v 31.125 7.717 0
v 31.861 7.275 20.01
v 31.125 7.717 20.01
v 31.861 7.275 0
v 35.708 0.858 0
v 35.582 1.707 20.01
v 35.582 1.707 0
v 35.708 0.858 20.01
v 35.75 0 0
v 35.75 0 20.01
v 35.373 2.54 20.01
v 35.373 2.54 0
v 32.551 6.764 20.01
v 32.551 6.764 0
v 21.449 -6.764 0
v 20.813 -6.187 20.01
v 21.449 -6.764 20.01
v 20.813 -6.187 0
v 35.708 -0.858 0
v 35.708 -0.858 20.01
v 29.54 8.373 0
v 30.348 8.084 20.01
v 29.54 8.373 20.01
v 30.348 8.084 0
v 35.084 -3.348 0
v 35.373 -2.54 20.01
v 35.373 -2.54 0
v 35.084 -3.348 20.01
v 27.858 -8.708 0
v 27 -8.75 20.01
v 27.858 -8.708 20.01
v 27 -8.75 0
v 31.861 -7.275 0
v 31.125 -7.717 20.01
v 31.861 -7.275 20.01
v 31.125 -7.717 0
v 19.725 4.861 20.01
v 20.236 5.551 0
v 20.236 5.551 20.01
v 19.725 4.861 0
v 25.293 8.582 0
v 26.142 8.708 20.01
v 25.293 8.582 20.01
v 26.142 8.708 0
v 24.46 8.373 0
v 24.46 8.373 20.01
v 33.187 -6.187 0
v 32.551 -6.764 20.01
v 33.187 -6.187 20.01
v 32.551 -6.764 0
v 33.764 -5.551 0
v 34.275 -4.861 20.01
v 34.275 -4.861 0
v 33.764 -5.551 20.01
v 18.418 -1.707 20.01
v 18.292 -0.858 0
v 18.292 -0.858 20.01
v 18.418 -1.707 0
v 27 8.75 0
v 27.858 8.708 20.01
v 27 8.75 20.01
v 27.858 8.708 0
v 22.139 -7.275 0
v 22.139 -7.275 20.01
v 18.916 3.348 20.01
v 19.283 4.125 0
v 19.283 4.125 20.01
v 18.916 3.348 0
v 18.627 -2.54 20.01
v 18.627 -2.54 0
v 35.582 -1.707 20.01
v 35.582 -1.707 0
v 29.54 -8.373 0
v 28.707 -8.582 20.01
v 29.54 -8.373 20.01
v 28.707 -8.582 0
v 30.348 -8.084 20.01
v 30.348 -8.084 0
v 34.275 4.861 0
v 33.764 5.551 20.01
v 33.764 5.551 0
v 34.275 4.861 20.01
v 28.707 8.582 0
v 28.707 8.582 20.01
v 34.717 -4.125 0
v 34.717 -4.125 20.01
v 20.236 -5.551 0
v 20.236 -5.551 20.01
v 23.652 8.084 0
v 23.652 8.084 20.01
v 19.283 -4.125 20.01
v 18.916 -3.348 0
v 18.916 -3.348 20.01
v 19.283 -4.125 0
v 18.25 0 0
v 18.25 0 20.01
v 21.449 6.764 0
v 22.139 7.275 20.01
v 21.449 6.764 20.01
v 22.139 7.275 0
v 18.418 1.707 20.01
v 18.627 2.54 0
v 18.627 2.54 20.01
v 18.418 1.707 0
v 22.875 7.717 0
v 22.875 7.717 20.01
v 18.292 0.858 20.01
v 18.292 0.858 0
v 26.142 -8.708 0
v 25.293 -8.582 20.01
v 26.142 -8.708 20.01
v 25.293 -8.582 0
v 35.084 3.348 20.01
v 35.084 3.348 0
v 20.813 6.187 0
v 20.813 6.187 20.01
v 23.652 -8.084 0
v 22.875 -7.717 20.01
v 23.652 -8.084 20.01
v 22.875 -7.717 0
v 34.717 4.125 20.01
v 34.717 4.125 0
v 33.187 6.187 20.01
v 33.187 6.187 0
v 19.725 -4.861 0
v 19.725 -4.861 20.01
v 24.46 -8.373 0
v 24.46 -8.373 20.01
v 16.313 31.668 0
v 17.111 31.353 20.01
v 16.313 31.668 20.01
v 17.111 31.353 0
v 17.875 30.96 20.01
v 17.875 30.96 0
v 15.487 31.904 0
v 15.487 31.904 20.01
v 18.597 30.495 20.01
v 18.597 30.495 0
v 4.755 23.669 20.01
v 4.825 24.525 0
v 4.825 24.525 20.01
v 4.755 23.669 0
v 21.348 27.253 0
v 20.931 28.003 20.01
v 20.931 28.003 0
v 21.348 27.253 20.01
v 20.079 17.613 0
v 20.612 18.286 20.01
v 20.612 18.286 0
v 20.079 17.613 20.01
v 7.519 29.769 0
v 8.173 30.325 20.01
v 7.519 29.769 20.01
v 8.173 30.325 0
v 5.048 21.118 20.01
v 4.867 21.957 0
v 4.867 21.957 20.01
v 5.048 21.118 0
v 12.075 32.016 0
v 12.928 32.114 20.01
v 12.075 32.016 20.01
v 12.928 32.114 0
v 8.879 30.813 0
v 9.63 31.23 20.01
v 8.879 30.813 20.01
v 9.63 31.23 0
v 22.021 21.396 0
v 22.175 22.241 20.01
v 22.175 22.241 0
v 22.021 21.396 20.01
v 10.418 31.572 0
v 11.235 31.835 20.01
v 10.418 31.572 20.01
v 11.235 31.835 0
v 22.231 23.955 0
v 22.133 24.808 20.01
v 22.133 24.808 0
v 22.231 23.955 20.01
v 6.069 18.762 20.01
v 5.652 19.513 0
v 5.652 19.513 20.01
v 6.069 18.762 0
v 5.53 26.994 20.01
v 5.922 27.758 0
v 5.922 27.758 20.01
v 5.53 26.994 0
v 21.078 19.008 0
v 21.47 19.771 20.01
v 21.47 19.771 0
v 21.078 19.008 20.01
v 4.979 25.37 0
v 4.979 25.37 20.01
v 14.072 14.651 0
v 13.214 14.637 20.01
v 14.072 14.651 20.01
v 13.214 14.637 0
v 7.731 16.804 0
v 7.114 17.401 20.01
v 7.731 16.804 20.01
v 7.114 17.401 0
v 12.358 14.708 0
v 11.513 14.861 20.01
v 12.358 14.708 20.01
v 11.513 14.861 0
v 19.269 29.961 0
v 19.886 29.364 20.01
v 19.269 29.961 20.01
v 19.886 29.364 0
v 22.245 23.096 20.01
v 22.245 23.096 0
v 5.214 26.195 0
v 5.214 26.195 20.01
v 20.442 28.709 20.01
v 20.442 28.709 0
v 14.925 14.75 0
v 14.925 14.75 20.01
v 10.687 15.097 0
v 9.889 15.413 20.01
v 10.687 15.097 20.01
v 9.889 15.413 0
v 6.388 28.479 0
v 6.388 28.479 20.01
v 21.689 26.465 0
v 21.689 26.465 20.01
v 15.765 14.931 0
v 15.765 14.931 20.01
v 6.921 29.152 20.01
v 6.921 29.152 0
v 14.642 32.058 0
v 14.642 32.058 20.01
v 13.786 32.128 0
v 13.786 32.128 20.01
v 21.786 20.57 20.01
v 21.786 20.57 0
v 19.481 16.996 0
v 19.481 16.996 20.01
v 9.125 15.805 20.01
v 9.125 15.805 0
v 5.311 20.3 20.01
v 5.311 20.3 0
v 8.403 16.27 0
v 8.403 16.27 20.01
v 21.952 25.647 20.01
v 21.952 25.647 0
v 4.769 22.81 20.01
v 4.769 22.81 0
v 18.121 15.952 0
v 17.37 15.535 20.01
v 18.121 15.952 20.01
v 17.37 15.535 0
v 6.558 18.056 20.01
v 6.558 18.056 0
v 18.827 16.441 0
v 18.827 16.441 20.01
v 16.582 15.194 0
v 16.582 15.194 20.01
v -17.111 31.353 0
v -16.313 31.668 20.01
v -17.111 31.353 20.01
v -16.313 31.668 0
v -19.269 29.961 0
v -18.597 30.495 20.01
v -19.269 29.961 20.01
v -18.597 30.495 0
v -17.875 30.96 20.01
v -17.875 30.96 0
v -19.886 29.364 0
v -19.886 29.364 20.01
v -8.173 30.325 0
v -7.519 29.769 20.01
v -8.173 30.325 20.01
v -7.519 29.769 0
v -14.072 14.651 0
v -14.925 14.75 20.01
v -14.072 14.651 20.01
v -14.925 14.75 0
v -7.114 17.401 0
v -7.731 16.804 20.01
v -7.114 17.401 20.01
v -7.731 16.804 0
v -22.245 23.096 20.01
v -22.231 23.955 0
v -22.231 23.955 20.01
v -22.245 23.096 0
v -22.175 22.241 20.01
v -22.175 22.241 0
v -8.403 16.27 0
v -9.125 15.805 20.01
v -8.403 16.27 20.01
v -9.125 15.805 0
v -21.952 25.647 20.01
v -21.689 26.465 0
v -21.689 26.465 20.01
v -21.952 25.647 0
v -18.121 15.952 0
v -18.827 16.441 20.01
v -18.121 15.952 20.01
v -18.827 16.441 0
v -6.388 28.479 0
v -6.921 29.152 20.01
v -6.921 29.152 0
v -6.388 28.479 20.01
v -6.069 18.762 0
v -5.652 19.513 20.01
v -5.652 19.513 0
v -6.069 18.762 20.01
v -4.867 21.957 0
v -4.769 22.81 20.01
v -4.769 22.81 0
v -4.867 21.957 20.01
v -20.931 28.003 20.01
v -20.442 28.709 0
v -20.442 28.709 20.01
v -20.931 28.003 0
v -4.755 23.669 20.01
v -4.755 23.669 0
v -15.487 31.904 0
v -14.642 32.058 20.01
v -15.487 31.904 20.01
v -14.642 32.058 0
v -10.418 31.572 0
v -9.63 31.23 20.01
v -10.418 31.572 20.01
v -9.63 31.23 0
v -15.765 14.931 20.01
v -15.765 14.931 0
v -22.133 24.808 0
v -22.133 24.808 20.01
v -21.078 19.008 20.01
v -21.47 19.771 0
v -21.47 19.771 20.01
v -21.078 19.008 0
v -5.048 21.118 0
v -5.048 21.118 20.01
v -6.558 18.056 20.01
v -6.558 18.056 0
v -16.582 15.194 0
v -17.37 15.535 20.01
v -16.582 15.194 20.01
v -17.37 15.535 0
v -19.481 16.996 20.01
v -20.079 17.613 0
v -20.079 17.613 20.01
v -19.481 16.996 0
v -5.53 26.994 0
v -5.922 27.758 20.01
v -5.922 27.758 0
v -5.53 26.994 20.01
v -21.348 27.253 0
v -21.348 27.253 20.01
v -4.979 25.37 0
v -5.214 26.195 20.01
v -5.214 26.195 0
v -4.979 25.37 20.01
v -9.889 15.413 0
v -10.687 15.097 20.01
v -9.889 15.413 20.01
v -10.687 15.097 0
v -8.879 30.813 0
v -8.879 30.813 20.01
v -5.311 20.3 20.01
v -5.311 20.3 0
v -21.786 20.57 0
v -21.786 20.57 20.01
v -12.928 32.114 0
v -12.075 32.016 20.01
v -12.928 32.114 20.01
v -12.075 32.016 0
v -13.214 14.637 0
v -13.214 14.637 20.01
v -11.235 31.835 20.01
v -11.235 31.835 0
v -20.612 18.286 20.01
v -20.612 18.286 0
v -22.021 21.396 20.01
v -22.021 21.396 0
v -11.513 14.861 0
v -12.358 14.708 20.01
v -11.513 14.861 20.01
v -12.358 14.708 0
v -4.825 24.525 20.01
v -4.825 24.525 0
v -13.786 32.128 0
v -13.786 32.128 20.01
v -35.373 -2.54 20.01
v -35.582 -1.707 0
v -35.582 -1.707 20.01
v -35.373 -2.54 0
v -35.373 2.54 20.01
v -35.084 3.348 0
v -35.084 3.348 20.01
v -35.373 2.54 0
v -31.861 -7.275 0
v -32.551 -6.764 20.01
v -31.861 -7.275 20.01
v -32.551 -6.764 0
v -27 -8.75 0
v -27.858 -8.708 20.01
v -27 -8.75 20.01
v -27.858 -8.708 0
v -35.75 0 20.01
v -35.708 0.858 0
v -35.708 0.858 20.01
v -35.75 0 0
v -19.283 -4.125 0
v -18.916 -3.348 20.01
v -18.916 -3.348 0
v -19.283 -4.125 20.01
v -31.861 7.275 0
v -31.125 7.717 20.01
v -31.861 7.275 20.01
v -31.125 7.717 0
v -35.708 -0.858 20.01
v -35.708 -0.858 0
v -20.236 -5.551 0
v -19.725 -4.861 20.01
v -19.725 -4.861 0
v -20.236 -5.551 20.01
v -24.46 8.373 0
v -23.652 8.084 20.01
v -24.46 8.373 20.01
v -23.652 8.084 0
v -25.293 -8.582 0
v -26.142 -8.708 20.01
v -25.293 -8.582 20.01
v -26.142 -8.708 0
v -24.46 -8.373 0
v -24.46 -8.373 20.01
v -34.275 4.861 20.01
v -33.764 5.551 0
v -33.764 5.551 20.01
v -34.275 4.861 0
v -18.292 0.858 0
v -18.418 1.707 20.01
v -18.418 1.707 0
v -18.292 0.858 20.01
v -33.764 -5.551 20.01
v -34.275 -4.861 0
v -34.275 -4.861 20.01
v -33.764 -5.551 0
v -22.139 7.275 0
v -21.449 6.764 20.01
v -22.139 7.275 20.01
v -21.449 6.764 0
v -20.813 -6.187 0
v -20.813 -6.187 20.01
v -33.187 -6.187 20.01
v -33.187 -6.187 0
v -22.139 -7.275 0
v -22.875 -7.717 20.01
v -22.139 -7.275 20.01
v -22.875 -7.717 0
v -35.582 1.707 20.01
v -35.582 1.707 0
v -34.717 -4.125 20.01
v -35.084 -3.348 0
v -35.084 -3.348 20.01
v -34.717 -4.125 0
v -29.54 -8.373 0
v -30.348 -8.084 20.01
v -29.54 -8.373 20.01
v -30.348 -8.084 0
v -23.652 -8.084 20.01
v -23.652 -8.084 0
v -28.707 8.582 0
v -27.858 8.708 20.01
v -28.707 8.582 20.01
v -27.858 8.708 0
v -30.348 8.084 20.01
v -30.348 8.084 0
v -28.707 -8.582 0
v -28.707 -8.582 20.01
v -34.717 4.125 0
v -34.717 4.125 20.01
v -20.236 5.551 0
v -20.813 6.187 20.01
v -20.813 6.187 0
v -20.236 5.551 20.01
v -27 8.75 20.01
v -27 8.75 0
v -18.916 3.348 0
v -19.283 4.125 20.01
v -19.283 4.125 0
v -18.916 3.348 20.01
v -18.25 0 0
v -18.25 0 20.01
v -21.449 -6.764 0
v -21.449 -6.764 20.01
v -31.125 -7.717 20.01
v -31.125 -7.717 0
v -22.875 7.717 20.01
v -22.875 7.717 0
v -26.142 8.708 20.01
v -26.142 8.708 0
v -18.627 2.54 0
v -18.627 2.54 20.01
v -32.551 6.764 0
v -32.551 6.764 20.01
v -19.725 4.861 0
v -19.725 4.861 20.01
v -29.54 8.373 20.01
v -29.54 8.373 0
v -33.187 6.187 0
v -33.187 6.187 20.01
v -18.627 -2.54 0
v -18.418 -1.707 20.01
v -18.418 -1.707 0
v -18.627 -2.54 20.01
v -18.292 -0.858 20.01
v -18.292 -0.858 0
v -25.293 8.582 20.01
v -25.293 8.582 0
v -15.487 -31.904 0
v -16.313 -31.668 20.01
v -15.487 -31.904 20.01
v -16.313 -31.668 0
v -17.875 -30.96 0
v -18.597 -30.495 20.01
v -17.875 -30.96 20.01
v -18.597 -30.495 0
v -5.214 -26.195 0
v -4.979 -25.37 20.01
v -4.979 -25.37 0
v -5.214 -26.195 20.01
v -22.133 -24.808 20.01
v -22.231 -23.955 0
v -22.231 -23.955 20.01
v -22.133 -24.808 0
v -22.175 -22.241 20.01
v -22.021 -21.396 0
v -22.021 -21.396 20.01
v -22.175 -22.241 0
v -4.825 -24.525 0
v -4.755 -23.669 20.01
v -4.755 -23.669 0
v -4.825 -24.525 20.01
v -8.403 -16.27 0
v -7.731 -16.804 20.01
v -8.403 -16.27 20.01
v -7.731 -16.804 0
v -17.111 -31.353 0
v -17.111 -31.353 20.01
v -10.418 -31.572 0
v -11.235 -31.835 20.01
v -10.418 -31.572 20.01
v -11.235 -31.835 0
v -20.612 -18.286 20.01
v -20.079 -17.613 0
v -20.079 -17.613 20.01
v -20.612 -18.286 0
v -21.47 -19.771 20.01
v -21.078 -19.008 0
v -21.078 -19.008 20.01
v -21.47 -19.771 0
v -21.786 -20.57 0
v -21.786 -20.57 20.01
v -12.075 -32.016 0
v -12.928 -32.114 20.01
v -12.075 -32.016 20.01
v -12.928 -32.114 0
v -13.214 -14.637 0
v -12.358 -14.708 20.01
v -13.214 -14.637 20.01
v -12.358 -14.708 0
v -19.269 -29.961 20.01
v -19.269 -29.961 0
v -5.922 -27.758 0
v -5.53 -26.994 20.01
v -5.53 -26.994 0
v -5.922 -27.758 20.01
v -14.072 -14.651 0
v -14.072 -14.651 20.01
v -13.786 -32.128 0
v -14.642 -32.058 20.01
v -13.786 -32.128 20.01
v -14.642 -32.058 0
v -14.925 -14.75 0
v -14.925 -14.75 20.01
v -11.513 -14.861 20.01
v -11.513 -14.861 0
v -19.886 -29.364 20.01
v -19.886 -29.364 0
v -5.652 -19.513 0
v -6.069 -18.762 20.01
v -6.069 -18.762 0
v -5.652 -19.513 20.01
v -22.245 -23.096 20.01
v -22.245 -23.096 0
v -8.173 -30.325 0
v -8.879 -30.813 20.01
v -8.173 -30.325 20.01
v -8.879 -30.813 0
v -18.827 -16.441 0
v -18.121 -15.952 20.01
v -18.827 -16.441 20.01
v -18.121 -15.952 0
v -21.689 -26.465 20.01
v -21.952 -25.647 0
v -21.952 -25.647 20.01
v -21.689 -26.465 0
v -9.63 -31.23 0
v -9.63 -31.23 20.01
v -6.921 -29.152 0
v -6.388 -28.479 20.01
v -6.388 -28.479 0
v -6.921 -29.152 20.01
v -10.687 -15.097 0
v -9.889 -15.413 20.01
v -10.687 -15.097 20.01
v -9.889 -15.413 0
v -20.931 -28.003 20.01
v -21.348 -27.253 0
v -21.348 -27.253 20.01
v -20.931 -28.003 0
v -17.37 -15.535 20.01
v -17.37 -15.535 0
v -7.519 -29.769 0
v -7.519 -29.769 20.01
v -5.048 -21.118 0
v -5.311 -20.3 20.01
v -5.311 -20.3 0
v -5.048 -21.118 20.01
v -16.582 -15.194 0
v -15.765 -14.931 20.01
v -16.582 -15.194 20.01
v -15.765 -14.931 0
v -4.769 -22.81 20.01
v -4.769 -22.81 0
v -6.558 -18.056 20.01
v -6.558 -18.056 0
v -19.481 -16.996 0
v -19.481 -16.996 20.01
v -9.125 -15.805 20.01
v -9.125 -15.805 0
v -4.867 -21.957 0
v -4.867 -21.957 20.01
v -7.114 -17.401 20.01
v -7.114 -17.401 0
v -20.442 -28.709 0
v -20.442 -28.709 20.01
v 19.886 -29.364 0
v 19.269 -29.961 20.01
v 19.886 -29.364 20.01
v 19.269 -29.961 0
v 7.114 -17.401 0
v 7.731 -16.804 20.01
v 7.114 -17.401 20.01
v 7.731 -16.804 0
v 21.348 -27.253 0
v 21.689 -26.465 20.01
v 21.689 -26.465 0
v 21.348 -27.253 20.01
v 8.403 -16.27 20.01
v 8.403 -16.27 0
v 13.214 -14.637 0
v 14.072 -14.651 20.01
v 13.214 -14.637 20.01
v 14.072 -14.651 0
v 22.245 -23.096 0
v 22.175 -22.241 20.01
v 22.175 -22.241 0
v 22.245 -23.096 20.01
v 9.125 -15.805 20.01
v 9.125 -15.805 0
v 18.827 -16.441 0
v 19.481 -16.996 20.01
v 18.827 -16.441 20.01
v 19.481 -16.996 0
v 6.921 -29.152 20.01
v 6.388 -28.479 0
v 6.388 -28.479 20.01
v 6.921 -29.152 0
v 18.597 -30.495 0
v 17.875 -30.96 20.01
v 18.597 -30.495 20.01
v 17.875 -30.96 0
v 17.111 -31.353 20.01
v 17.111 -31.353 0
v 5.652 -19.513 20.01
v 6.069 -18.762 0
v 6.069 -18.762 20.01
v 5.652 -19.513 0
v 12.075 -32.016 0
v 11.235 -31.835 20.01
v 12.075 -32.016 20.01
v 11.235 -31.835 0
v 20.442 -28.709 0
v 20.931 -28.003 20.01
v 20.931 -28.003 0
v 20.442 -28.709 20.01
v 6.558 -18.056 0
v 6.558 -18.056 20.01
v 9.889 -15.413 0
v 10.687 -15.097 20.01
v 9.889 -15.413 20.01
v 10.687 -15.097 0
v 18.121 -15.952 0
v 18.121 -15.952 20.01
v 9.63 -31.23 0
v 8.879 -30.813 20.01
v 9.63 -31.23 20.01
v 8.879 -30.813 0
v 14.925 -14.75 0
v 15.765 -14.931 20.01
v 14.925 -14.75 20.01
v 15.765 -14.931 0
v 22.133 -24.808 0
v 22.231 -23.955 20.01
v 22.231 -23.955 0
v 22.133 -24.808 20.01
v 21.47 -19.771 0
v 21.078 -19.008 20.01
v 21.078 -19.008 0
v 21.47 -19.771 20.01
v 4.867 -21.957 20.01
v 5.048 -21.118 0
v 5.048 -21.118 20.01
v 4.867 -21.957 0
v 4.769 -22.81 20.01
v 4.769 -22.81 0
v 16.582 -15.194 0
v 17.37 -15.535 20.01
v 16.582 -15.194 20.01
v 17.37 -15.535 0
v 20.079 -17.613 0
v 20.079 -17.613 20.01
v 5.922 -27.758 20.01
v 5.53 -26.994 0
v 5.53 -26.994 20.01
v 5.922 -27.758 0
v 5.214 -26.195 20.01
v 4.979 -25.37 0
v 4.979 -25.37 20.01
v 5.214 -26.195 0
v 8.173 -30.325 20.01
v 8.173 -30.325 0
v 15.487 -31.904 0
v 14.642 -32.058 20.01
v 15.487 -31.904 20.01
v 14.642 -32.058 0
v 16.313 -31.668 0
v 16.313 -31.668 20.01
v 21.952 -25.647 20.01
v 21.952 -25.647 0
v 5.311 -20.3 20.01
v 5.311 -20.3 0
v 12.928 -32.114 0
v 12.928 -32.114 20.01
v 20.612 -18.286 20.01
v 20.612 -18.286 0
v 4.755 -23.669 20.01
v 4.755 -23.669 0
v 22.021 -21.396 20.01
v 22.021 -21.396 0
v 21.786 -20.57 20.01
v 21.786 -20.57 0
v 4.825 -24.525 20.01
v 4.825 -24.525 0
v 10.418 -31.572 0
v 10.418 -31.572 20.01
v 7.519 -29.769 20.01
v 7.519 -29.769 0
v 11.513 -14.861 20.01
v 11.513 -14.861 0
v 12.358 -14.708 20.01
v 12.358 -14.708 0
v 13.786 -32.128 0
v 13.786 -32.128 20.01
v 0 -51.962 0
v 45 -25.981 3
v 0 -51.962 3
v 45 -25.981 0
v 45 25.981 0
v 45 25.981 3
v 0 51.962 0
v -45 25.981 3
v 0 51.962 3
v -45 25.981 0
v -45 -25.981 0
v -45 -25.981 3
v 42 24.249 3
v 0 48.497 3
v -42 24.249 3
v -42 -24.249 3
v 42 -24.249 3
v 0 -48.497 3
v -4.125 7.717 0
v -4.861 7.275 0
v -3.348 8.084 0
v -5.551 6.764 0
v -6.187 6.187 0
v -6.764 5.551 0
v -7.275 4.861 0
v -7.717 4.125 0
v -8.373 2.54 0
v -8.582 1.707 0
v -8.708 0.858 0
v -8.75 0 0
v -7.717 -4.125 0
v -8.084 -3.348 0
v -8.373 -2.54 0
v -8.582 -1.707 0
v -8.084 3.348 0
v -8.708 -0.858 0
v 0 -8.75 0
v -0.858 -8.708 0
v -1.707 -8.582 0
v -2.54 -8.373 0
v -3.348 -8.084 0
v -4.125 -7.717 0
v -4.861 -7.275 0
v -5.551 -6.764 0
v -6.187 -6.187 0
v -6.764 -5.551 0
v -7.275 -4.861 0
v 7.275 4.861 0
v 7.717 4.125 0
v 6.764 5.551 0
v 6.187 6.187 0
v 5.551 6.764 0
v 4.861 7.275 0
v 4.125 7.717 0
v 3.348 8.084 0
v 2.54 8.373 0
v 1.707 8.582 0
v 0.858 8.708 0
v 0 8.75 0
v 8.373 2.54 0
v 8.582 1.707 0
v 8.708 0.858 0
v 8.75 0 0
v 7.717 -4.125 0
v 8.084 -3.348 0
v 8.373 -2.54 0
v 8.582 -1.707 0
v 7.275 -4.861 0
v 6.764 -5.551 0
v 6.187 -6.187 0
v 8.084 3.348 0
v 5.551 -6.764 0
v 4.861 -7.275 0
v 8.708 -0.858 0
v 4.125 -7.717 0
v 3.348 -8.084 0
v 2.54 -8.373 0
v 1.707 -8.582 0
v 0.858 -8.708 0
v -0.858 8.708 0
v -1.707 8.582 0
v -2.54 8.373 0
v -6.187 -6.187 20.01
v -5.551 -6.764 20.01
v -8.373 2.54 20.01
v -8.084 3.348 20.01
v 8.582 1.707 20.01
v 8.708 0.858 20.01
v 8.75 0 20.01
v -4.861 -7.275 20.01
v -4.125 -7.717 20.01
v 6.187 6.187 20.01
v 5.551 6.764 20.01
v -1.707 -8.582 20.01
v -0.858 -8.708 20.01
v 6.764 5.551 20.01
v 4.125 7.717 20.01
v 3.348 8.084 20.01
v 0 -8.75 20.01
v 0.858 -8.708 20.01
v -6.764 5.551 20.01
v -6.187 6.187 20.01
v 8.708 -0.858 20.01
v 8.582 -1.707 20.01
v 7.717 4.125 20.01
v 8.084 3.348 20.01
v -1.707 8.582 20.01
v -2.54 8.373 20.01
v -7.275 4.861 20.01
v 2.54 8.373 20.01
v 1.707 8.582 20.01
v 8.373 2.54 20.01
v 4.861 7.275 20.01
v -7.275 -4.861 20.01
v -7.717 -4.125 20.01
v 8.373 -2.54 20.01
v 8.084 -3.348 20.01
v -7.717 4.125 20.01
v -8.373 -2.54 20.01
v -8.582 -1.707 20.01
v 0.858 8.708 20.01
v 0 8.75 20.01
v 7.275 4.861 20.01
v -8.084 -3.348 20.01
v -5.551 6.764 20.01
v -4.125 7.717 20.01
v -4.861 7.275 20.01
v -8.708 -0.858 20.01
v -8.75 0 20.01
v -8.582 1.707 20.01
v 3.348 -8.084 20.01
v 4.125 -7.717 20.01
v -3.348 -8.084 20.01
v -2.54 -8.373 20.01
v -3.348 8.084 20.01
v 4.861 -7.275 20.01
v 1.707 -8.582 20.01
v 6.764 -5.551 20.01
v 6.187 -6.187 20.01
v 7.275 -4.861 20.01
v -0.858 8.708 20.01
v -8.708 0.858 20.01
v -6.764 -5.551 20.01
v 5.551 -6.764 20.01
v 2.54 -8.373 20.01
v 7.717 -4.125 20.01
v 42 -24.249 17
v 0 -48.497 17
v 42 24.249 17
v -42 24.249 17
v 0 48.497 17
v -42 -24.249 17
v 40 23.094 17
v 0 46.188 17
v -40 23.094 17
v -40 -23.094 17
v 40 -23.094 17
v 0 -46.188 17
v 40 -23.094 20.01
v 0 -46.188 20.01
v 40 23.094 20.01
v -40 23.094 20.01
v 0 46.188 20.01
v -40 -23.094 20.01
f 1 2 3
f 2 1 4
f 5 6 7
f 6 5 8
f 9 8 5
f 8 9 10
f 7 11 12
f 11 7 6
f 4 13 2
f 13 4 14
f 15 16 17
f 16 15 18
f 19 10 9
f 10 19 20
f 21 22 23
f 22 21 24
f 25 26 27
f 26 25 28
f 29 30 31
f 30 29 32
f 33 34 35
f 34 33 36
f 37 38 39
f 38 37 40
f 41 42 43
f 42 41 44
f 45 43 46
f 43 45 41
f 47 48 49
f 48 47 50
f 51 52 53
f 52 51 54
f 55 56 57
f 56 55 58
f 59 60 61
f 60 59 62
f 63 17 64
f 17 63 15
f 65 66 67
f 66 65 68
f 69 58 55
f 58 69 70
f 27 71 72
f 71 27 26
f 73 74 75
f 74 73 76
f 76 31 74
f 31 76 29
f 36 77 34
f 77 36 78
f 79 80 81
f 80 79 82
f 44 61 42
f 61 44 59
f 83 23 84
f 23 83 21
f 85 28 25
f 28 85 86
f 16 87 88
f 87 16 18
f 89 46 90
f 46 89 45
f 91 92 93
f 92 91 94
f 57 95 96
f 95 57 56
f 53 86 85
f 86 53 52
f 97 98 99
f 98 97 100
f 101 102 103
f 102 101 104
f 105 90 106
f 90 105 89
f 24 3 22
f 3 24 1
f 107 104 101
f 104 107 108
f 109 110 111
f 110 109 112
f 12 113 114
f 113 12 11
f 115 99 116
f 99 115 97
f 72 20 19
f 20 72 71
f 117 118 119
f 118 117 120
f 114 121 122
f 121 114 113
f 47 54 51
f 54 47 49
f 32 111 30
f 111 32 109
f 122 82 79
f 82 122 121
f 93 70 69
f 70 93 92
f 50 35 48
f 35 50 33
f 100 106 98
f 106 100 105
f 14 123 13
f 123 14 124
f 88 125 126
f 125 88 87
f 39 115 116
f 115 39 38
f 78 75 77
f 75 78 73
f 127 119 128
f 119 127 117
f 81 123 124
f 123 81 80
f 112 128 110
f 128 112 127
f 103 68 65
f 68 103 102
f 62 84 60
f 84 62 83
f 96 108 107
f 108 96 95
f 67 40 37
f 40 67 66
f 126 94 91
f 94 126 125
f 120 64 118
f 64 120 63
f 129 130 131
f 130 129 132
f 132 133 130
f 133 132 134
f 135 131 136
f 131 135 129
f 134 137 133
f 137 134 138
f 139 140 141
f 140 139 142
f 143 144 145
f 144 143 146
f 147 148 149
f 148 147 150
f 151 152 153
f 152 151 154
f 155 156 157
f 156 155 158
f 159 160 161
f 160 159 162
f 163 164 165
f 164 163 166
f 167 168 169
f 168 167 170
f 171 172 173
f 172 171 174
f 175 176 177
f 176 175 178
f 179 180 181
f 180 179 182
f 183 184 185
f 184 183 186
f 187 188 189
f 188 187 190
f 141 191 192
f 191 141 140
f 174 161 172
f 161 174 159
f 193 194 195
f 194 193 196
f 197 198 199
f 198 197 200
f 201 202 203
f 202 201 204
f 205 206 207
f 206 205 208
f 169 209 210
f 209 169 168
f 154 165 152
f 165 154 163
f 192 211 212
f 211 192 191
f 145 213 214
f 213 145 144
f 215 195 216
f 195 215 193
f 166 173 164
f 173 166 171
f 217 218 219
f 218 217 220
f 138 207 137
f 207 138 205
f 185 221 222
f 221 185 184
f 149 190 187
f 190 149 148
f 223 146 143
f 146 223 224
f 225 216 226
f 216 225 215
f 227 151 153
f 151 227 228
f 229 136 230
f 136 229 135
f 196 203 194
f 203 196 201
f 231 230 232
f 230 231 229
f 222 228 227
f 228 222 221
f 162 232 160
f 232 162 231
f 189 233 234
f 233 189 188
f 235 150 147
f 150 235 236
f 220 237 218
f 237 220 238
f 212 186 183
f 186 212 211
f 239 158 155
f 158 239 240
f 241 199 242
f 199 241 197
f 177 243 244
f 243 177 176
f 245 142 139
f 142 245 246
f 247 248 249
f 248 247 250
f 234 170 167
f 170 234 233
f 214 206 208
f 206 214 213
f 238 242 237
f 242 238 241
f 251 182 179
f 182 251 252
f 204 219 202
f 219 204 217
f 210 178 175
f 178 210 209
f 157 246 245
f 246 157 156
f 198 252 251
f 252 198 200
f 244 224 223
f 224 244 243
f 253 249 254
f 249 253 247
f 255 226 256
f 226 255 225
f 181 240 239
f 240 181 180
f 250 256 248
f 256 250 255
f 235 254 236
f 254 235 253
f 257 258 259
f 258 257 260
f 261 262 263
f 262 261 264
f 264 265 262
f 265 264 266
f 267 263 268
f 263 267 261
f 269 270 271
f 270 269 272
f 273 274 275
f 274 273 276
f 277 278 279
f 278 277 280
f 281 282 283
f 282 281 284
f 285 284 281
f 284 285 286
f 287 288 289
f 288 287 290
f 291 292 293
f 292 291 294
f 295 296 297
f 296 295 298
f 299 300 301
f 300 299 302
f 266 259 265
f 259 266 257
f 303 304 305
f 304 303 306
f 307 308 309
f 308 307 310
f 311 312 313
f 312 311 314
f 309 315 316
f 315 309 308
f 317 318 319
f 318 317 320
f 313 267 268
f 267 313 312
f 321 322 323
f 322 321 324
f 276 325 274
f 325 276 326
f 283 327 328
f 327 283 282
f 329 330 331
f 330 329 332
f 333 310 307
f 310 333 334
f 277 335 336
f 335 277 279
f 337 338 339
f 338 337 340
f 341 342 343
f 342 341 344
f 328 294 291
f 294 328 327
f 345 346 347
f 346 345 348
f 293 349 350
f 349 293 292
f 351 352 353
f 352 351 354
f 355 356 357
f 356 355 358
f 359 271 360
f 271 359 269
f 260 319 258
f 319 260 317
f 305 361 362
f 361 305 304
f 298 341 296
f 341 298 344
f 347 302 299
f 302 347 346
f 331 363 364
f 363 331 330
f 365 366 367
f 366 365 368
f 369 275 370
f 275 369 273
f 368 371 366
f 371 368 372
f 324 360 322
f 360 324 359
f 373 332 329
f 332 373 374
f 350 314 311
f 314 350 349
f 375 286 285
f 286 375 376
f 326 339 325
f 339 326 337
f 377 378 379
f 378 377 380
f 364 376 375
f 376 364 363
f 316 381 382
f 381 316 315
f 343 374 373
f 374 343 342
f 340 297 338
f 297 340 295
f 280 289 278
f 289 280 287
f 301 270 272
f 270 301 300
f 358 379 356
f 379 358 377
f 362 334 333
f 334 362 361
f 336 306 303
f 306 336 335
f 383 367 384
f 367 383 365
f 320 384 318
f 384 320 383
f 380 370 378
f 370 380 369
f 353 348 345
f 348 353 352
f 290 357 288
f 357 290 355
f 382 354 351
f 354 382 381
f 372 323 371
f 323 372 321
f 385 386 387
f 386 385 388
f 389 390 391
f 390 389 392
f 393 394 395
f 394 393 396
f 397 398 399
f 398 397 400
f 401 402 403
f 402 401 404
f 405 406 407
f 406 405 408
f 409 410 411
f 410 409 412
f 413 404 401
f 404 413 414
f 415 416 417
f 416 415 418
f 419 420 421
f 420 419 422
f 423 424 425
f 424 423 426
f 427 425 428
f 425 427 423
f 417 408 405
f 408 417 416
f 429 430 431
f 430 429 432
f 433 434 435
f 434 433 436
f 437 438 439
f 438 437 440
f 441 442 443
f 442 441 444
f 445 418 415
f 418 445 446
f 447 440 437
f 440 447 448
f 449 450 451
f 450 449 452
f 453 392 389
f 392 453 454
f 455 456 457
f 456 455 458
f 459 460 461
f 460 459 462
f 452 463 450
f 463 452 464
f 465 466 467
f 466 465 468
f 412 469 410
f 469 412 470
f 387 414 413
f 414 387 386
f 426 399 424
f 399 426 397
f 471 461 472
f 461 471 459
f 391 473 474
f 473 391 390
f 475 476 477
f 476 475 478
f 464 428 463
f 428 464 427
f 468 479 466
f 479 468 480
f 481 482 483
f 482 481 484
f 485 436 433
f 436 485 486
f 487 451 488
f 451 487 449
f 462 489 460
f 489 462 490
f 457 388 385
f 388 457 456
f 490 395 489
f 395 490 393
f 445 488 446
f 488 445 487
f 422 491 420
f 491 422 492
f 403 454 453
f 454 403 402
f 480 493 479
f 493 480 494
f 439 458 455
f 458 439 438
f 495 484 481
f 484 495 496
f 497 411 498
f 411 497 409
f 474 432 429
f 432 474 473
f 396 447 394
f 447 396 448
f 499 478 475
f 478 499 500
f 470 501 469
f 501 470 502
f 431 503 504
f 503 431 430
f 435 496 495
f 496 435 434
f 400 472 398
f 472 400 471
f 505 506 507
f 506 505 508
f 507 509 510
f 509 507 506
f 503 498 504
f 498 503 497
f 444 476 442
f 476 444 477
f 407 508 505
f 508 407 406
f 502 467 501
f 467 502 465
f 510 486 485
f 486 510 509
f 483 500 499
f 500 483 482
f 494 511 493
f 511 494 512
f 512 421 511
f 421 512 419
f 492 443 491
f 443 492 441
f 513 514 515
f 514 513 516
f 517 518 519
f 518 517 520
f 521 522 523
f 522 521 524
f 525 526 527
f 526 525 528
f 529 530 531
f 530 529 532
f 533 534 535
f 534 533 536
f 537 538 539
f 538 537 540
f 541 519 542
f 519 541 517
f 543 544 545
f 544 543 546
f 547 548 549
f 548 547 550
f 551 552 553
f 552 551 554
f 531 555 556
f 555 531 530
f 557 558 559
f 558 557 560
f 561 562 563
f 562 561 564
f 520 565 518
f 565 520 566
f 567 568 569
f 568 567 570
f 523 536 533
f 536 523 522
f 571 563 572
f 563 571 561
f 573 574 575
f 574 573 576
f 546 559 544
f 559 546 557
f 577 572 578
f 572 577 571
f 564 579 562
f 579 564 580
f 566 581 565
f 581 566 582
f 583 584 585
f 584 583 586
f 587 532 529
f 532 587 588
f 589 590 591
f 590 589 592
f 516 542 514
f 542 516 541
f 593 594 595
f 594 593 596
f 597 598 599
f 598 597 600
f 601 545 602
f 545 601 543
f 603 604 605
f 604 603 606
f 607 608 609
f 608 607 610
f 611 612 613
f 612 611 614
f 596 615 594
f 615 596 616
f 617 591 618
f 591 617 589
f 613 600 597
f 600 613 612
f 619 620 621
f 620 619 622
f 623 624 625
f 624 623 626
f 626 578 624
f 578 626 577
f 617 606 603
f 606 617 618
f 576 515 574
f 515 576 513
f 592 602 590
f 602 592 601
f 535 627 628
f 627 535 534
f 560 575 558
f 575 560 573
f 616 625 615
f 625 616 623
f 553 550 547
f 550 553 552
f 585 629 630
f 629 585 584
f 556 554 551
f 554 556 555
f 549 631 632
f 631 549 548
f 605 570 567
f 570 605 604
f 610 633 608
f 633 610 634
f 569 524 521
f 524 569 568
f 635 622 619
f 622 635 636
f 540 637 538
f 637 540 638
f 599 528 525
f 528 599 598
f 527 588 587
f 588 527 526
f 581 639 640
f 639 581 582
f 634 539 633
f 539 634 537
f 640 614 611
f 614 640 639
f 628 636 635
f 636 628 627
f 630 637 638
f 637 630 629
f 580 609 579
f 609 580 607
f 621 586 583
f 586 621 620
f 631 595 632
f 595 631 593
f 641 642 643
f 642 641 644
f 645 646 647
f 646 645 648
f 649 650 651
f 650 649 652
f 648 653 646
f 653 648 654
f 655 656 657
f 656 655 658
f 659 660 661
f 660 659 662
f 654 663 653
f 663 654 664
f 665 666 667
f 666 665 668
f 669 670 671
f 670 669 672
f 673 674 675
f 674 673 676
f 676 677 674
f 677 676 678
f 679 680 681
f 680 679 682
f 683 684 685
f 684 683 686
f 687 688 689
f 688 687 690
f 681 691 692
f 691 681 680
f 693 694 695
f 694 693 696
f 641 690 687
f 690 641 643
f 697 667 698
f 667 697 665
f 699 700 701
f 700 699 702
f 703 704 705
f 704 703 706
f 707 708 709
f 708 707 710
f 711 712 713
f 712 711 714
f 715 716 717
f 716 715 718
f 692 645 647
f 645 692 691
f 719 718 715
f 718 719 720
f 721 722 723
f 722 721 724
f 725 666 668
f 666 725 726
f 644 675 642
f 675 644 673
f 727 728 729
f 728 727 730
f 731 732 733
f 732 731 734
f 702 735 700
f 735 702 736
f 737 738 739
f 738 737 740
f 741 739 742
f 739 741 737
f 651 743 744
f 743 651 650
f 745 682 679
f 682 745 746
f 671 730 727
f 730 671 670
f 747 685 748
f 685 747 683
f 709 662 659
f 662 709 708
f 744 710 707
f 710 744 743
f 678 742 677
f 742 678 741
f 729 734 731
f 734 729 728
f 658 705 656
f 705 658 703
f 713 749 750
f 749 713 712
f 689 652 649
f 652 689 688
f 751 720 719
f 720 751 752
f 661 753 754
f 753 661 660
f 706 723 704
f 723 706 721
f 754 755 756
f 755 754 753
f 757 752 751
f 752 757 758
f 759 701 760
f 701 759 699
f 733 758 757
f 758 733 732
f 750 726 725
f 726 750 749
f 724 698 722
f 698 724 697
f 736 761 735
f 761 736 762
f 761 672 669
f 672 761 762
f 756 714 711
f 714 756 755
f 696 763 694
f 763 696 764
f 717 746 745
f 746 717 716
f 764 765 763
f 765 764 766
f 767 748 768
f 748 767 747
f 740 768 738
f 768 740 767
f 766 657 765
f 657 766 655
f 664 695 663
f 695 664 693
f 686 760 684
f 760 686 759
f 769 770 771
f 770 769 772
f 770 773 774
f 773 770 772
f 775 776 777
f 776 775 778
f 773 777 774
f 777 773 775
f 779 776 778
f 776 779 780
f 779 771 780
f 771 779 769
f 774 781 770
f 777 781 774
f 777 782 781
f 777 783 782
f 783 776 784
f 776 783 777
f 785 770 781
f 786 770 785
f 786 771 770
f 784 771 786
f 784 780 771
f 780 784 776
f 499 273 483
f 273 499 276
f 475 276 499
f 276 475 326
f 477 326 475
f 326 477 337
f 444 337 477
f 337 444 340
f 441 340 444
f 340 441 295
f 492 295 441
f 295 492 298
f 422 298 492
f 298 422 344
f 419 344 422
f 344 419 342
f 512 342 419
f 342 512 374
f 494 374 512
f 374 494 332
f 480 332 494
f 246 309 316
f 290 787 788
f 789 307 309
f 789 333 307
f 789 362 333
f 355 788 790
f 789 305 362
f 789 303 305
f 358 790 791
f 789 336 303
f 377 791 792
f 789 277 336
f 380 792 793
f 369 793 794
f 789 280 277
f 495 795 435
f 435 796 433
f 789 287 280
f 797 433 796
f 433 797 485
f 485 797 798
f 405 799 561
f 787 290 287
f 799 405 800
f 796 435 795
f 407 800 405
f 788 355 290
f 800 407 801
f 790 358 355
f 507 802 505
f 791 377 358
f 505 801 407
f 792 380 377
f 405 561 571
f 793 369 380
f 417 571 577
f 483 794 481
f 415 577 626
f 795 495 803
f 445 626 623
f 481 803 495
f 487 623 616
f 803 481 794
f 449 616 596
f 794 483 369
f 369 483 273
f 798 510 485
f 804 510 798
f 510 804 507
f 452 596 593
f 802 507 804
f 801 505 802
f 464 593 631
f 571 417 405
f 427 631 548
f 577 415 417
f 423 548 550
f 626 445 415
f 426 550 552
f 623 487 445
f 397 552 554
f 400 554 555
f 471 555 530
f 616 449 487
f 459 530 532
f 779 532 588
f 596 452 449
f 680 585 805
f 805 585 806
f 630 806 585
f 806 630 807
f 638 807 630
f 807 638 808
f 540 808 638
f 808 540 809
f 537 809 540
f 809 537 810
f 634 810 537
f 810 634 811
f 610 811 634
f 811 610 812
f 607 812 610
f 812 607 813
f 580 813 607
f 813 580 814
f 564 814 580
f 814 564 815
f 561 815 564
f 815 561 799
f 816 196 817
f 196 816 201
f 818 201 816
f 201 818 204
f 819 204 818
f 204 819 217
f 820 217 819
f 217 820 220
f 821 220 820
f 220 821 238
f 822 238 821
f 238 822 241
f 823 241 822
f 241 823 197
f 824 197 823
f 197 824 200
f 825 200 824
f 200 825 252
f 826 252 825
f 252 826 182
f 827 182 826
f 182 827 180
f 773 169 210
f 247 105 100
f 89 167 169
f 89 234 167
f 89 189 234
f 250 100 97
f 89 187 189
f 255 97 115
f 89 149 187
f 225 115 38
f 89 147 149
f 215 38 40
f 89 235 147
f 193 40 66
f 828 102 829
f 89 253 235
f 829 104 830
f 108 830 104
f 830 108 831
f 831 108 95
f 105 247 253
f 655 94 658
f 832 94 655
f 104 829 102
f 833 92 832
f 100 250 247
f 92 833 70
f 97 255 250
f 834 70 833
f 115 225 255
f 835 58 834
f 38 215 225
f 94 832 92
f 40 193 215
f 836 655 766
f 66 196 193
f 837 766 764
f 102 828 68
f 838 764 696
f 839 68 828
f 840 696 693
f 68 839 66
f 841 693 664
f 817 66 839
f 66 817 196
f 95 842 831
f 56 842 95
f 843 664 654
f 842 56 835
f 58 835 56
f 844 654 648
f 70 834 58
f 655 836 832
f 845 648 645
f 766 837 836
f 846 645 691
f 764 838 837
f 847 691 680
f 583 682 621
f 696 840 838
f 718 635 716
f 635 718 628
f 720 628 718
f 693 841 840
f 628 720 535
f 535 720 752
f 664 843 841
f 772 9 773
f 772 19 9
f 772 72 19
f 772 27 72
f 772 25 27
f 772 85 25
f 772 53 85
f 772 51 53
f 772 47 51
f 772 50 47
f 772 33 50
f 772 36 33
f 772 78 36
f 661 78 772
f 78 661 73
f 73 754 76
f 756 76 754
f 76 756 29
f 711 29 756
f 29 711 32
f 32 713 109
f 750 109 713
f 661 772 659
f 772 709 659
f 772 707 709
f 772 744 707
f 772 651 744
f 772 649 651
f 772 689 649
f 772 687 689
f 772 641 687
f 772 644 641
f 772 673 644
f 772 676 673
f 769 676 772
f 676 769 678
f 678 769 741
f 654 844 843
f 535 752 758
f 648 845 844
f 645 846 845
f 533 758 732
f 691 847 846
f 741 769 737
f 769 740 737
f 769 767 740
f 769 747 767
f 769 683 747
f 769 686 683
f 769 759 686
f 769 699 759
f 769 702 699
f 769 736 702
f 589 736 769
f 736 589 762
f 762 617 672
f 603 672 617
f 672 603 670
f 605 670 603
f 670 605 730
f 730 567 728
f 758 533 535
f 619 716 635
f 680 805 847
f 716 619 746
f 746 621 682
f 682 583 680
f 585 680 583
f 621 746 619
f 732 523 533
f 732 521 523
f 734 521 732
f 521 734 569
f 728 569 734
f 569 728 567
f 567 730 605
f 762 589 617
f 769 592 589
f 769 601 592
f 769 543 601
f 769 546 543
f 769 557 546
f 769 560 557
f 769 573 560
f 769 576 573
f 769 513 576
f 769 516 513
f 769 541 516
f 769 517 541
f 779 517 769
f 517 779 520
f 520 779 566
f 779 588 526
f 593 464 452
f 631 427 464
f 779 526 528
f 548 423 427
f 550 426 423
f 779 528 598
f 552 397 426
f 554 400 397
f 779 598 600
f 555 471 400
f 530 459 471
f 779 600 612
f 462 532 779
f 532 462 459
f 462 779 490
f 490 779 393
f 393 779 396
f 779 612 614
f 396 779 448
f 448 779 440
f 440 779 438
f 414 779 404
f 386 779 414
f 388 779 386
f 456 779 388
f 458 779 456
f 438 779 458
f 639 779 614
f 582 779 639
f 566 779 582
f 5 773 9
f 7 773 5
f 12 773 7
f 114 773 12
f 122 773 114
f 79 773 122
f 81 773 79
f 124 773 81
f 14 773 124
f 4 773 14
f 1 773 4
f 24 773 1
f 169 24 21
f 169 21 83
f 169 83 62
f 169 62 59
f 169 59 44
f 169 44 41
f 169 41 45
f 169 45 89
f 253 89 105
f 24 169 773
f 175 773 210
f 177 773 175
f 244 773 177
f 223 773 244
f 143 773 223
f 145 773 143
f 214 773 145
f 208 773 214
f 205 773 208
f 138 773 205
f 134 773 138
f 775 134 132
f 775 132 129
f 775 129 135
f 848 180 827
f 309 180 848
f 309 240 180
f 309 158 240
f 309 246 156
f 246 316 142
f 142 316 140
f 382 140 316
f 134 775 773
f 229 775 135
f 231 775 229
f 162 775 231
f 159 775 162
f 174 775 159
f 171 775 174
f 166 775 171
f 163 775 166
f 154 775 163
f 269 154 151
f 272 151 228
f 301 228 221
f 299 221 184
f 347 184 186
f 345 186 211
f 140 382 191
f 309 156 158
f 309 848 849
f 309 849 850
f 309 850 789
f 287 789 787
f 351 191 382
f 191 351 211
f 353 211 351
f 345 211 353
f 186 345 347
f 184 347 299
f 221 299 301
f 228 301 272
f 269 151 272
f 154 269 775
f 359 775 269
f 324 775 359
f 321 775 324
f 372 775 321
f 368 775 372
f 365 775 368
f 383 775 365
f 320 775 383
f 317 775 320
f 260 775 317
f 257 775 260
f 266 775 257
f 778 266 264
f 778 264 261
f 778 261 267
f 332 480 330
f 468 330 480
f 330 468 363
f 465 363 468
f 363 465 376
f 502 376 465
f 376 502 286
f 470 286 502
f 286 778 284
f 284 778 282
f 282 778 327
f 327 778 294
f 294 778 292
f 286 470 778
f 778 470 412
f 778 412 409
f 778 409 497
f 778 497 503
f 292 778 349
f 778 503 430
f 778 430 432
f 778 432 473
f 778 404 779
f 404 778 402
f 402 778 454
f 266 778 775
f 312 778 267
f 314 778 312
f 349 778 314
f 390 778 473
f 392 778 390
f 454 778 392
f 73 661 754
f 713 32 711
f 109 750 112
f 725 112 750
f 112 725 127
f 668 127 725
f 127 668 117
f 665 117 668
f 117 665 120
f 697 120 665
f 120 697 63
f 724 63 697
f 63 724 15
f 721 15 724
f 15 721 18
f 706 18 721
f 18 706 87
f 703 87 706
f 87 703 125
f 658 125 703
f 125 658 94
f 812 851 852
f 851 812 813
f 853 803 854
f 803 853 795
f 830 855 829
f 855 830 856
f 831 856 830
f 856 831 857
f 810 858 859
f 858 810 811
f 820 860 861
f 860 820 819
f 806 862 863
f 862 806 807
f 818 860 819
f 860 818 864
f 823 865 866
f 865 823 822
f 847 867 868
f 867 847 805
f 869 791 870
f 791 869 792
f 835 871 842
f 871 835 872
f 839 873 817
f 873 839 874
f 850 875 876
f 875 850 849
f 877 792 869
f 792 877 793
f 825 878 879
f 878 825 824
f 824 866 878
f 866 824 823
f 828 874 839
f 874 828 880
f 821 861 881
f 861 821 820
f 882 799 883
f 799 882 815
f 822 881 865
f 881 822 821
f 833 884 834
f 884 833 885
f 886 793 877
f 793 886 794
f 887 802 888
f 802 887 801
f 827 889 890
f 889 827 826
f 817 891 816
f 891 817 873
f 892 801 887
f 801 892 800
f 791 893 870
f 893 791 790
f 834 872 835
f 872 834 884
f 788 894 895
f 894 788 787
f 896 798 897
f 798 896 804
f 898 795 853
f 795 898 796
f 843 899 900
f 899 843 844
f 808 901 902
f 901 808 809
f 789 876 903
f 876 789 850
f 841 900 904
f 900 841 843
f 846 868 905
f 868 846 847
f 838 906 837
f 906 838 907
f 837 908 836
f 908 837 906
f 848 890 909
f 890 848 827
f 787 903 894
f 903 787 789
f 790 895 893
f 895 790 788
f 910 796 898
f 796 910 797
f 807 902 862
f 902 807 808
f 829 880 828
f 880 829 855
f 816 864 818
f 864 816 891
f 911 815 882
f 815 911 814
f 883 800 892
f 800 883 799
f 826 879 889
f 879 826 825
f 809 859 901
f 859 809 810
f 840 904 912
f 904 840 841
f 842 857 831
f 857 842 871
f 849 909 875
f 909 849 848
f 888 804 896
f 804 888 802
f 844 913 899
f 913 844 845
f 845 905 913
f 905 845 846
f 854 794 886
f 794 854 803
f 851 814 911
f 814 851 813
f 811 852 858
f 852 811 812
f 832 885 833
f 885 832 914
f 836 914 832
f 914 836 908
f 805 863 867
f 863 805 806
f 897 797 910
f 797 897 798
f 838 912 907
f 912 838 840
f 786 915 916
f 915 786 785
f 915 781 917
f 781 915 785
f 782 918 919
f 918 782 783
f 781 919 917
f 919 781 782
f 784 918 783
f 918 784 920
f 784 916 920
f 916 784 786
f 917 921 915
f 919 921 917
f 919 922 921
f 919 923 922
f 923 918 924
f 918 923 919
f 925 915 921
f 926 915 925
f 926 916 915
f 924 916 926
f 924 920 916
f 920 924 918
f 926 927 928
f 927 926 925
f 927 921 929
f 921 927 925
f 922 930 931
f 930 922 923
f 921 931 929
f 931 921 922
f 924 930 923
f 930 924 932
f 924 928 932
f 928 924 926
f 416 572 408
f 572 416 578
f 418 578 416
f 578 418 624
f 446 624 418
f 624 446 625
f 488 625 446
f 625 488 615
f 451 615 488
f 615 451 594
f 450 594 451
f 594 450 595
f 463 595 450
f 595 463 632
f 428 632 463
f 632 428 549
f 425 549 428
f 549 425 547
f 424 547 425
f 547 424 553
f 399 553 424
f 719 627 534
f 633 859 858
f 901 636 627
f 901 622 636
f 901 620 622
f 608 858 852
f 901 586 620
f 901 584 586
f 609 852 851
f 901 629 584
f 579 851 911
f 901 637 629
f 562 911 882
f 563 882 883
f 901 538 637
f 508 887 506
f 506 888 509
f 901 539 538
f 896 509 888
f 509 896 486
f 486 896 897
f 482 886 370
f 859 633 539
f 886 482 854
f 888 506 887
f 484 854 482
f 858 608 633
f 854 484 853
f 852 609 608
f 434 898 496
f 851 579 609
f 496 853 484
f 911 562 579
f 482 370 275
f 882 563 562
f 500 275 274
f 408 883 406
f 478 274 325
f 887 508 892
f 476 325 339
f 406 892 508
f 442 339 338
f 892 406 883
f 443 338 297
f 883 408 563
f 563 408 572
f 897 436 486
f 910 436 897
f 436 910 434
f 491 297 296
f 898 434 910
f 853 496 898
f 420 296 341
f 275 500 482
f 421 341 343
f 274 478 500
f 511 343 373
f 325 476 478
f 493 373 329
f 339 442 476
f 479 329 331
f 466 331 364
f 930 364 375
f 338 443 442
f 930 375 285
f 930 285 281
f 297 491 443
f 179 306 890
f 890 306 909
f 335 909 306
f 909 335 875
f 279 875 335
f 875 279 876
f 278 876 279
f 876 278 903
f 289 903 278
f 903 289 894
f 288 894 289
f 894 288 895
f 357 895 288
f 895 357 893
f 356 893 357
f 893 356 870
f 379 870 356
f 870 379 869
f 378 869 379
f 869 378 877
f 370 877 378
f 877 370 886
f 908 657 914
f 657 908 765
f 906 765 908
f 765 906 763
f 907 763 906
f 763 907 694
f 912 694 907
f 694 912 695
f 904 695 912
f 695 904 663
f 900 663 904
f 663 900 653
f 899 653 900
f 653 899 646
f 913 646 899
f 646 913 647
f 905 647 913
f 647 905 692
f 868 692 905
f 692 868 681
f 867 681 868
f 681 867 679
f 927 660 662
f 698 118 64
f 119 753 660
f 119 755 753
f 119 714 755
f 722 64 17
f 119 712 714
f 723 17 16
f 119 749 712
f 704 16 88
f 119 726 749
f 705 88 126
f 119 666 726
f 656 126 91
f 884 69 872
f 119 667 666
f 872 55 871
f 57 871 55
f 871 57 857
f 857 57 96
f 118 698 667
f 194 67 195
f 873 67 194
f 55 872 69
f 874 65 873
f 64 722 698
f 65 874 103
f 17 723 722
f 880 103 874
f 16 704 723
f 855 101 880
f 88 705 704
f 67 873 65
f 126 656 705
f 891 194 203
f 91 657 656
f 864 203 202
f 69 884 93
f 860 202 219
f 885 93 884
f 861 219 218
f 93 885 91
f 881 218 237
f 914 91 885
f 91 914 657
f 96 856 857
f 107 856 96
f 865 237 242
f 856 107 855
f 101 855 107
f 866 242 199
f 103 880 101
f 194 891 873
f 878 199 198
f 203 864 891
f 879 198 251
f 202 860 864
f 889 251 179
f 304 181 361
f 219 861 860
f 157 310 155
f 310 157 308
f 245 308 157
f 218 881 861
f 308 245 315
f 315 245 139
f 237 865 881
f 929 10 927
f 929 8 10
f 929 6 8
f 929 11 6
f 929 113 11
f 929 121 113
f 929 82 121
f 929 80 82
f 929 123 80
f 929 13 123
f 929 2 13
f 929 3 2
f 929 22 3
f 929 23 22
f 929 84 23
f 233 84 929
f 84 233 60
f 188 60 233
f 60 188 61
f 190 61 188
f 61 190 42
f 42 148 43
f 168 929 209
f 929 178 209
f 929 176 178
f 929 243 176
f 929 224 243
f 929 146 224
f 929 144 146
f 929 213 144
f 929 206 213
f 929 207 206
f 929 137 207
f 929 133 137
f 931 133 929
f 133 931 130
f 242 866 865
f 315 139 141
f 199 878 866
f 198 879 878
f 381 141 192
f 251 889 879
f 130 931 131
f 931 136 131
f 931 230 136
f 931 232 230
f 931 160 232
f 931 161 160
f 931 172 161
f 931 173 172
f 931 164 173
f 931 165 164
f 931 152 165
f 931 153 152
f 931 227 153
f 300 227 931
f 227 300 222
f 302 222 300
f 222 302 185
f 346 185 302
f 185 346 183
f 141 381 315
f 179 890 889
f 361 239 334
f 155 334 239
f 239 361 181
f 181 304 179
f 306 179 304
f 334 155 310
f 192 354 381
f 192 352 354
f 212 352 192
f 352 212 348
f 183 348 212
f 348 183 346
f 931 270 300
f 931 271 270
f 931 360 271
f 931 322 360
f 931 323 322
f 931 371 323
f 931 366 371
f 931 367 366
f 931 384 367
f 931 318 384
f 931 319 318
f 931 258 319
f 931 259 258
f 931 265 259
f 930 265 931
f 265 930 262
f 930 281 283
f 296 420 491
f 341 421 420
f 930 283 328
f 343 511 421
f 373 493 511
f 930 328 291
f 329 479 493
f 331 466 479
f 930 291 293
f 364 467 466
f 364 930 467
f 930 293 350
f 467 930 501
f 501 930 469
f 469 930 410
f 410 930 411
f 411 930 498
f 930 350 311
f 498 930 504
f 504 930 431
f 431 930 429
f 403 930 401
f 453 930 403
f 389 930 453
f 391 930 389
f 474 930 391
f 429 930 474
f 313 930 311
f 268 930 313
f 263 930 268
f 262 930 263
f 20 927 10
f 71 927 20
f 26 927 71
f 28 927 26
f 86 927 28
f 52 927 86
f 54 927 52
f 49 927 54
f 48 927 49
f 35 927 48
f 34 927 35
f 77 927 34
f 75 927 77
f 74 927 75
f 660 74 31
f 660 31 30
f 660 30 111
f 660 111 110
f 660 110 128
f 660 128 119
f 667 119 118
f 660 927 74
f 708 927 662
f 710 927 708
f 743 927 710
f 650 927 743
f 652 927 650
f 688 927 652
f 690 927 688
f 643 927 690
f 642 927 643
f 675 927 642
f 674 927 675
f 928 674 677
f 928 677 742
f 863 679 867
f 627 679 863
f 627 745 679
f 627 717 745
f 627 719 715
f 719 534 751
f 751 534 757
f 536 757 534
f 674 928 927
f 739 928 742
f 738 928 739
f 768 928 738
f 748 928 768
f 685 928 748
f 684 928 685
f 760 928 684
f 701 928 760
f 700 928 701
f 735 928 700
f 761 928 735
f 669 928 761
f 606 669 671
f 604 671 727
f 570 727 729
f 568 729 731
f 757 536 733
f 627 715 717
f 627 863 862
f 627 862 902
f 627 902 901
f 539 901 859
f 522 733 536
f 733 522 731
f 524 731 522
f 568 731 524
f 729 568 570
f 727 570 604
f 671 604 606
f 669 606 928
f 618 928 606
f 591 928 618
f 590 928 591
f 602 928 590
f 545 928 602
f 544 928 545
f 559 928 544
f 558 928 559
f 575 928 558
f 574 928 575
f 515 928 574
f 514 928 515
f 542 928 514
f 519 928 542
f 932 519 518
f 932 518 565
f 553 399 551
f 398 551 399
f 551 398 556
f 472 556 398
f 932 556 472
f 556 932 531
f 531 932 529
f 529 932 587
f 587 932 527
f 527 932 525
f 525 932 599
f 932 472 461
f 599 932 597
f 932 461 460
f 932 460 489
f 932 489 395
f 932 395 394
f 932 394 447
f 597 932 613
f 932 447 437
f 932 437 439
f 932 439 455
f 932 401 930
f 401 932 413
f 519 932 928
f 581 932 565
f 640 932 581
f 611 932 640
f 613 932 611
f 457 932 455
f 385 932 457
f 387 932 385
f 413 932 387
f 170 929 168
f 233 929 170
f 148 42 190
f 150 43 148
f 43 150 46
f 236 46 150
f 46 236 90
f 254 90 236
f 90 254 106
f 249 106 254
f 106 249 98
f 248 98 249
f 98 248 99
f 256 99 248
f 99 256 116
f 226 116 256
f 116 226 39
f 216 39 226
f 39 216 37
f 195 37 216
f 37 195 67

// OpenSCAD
// --- Dimensions ---
plate_thickness = 3;            // Thickness of the hexagonal plate
hex_across_flats = 90;           // Distance between parallel sides of the plate
hex_skirt_across_flats = 84;     // Distance between parallel sides of the skirt
skirt_wall_thickness = 2;        // Thickness of the hexagonal skirt wall
skirt_height_total = 20;         // Total height of the part (Z=0 to Z=20)

hole_diameter = 17.5;            // Diameter of the conical tube holes
hole_spacing_diameter = 54;      // Diameter of the circle on which holes are placed
sleeve_outer_diameter = 21.5;    // Outside diameter of the sleeves
sleeve_height_total = 20;        // Total height of the sleeves (Z=0 to Z=20)

// --- Constants ---
$fn = 64;

// Helper function to calculate the radius of a regular hexagon from across-flats distance
// Radius (to vertex) = (across_flats / 2) / cos(30)
function hex_radius(across_flats) = (across_flats / 2) / cos(30);

// --- Construction Logic ---
// The user wants the part printed "upside down" relative to use.
// The plate is at Z=0 to 3. The features (sleeves and skirt) rise from the plate to Z=20.
// This means the "bottom" of the part (the plate) is the base on the bed.
// To ensure the part is a single solid and the holes are correctly subtracted:

union() {
    // 1. The Hexagonal Plate (Base)
    // We use a difference to create the holes in the plate.
    difference() {
        // The solid plate
        // To get flats parallel to X, we rotate the hexagon by 30 degrees.
        // A standard cylinder(fn=6) has vertices on the X-axis. 
        // Rotating 30 deg puts the flat side parallel to X.
        rotate([0, 0, 30])
        cylinder(h = plate_thickness, r = hex_radius(hex_across_flats), $fn = 6);

        // Subtract the 7 holes (through the plate)
        // Center hole
        translate([0, 0, -0.01])
        cylinder(h = plate_thickness + 0.02, d = hole_diameter);
        
        // 6 Peripheral holes
        for (a = [0 : 60 : 300]) {
            rotate([0, 0, a])
            translate([hole_spacing_diameter / 2, 0, -0.01])
            cylinder(h = plate_thickness + 0.02, d = hole_diameter);
        }
    }

    // 2. The Sleeves and Skirt
    // These rise from the plate (Z=3) to Z=20.
    // However, to ensure a watertight solid, we model them from Z=0 to Z=20 
    // and let the union/difference handle the overlap.
    
    // The Sleeves
    // Note: The user said "rises from the plate to z=20". 
    // If the plate is 3mm thick, the sleeve height is 17mm.
    // To avoid gaps, we model them from Z=0 to Z=20.
    // Since they are "sleeves" for the holes, they must be hollow.
    // We will use a union of the solid cylinders and then subtract the holes 
    // from the entire assembly to ensure the holes go through the sleeves too.
    
    // Let's use a different approach for a cleaner model:
    // Total Part = (Plate + Sleeves + Skirt) - Holes
}

// --- RE-STRUCTURED MODEL FOR ACCURACY ---
// We will build the solid mass first, then subtract the holes.

difference() {
    // THE SOLID MASS
    union() {
        // The Plate
        rotate([0, 0, 30])
        cylinder(h = plate_thickness, r = hex_radius(hex_across_flats), $fn = 6);

        // The Sleeves (Solid cylinders)
        // They rise from the plate (Z=3) to Z=20.
        // To make them "sleeves", we add them as solid and subtract holes later.
        cylinder(h = skirt_height_total - plate_thickness, d = sleeve_outer_diameter); // Center sleeve
        for (a = [0 : 60 : 300]) {
            rotate([0, 0, a])
            translate([hole_spacing_diameter / 2, 0, plate_thickness])
            cylinder(h = skirt_height_total - plate_thickness, d = sleeve_outer_diameter);
        }

        // The Hexagonal Skirt
        // Rises from plate (Z=3) to Z=20.
        // Outer dimension: 84mm across flats.
        // Wall thickness: 2mm.
        // We model the skirt as a solid hexagonal prism and then subtract the inner hex.
        // But wait, the skirt is a feature that rises from the plate.
        // To make it a single part, we add the outer hex and subtract the inner hex.
        
        // Outer Skirt Shell
        rotate([0, 0, 30])
        cylinder(h = skirt_height_total - plate_thickness, r = hex_radius(hex_skirt_across_flats), $fn = 6);
        
        // Inner Skirt Void (to create the 2mm wall)
        // The skirt is 84mm across flats. Inner is 84 - 4 = 80mm across flats.
        // We subtract this from the union.
        // To ensure it doesn't cut the plate, we translate it to Z=plate_thickness.
        translate([0, 0, plate_thickness])
        rotate([0, 0, 30])
        cylinder(h = skirt_height_total - plate_thickness + 0.01, r = hex_radius(hex_skirt_across_flats - 2*skirt_wall_thickness), $fn = 6);
    }

    // THE HOLES (Subtracted from the whole assembly)
    // Center hole
    translate([0, 0, -0.01])
    cylinder(h = plate_thickness + skirt_height_total + 0.02, d = hole_diameter);
    
    // 6 Peripheral holes
    for (a = [0 : 60 : 300]) {
        rotate([0, 0, a])
        translate([hole_spacing_diameter / 2, 0, -0.01])
        cylinder(h = plate_thickness + skirt_height_total + 0.02, d = hole_diameter);
    }
}

// Note on Skirt logic: 
// The user said "A hexagonal skirt... rises from the plate to z=20".
// This implies the skirt is a ring. 
// My code: 
// 1. Union(Plate, Sleeves, Outer_Skirt_Shell)
// 2. Subtract(Inner_Skirt_Void)
// 3. Subtract(Holes)
// This results in a plate with 7 holes, 6 sleeves around them, and a hexagonal wall.
